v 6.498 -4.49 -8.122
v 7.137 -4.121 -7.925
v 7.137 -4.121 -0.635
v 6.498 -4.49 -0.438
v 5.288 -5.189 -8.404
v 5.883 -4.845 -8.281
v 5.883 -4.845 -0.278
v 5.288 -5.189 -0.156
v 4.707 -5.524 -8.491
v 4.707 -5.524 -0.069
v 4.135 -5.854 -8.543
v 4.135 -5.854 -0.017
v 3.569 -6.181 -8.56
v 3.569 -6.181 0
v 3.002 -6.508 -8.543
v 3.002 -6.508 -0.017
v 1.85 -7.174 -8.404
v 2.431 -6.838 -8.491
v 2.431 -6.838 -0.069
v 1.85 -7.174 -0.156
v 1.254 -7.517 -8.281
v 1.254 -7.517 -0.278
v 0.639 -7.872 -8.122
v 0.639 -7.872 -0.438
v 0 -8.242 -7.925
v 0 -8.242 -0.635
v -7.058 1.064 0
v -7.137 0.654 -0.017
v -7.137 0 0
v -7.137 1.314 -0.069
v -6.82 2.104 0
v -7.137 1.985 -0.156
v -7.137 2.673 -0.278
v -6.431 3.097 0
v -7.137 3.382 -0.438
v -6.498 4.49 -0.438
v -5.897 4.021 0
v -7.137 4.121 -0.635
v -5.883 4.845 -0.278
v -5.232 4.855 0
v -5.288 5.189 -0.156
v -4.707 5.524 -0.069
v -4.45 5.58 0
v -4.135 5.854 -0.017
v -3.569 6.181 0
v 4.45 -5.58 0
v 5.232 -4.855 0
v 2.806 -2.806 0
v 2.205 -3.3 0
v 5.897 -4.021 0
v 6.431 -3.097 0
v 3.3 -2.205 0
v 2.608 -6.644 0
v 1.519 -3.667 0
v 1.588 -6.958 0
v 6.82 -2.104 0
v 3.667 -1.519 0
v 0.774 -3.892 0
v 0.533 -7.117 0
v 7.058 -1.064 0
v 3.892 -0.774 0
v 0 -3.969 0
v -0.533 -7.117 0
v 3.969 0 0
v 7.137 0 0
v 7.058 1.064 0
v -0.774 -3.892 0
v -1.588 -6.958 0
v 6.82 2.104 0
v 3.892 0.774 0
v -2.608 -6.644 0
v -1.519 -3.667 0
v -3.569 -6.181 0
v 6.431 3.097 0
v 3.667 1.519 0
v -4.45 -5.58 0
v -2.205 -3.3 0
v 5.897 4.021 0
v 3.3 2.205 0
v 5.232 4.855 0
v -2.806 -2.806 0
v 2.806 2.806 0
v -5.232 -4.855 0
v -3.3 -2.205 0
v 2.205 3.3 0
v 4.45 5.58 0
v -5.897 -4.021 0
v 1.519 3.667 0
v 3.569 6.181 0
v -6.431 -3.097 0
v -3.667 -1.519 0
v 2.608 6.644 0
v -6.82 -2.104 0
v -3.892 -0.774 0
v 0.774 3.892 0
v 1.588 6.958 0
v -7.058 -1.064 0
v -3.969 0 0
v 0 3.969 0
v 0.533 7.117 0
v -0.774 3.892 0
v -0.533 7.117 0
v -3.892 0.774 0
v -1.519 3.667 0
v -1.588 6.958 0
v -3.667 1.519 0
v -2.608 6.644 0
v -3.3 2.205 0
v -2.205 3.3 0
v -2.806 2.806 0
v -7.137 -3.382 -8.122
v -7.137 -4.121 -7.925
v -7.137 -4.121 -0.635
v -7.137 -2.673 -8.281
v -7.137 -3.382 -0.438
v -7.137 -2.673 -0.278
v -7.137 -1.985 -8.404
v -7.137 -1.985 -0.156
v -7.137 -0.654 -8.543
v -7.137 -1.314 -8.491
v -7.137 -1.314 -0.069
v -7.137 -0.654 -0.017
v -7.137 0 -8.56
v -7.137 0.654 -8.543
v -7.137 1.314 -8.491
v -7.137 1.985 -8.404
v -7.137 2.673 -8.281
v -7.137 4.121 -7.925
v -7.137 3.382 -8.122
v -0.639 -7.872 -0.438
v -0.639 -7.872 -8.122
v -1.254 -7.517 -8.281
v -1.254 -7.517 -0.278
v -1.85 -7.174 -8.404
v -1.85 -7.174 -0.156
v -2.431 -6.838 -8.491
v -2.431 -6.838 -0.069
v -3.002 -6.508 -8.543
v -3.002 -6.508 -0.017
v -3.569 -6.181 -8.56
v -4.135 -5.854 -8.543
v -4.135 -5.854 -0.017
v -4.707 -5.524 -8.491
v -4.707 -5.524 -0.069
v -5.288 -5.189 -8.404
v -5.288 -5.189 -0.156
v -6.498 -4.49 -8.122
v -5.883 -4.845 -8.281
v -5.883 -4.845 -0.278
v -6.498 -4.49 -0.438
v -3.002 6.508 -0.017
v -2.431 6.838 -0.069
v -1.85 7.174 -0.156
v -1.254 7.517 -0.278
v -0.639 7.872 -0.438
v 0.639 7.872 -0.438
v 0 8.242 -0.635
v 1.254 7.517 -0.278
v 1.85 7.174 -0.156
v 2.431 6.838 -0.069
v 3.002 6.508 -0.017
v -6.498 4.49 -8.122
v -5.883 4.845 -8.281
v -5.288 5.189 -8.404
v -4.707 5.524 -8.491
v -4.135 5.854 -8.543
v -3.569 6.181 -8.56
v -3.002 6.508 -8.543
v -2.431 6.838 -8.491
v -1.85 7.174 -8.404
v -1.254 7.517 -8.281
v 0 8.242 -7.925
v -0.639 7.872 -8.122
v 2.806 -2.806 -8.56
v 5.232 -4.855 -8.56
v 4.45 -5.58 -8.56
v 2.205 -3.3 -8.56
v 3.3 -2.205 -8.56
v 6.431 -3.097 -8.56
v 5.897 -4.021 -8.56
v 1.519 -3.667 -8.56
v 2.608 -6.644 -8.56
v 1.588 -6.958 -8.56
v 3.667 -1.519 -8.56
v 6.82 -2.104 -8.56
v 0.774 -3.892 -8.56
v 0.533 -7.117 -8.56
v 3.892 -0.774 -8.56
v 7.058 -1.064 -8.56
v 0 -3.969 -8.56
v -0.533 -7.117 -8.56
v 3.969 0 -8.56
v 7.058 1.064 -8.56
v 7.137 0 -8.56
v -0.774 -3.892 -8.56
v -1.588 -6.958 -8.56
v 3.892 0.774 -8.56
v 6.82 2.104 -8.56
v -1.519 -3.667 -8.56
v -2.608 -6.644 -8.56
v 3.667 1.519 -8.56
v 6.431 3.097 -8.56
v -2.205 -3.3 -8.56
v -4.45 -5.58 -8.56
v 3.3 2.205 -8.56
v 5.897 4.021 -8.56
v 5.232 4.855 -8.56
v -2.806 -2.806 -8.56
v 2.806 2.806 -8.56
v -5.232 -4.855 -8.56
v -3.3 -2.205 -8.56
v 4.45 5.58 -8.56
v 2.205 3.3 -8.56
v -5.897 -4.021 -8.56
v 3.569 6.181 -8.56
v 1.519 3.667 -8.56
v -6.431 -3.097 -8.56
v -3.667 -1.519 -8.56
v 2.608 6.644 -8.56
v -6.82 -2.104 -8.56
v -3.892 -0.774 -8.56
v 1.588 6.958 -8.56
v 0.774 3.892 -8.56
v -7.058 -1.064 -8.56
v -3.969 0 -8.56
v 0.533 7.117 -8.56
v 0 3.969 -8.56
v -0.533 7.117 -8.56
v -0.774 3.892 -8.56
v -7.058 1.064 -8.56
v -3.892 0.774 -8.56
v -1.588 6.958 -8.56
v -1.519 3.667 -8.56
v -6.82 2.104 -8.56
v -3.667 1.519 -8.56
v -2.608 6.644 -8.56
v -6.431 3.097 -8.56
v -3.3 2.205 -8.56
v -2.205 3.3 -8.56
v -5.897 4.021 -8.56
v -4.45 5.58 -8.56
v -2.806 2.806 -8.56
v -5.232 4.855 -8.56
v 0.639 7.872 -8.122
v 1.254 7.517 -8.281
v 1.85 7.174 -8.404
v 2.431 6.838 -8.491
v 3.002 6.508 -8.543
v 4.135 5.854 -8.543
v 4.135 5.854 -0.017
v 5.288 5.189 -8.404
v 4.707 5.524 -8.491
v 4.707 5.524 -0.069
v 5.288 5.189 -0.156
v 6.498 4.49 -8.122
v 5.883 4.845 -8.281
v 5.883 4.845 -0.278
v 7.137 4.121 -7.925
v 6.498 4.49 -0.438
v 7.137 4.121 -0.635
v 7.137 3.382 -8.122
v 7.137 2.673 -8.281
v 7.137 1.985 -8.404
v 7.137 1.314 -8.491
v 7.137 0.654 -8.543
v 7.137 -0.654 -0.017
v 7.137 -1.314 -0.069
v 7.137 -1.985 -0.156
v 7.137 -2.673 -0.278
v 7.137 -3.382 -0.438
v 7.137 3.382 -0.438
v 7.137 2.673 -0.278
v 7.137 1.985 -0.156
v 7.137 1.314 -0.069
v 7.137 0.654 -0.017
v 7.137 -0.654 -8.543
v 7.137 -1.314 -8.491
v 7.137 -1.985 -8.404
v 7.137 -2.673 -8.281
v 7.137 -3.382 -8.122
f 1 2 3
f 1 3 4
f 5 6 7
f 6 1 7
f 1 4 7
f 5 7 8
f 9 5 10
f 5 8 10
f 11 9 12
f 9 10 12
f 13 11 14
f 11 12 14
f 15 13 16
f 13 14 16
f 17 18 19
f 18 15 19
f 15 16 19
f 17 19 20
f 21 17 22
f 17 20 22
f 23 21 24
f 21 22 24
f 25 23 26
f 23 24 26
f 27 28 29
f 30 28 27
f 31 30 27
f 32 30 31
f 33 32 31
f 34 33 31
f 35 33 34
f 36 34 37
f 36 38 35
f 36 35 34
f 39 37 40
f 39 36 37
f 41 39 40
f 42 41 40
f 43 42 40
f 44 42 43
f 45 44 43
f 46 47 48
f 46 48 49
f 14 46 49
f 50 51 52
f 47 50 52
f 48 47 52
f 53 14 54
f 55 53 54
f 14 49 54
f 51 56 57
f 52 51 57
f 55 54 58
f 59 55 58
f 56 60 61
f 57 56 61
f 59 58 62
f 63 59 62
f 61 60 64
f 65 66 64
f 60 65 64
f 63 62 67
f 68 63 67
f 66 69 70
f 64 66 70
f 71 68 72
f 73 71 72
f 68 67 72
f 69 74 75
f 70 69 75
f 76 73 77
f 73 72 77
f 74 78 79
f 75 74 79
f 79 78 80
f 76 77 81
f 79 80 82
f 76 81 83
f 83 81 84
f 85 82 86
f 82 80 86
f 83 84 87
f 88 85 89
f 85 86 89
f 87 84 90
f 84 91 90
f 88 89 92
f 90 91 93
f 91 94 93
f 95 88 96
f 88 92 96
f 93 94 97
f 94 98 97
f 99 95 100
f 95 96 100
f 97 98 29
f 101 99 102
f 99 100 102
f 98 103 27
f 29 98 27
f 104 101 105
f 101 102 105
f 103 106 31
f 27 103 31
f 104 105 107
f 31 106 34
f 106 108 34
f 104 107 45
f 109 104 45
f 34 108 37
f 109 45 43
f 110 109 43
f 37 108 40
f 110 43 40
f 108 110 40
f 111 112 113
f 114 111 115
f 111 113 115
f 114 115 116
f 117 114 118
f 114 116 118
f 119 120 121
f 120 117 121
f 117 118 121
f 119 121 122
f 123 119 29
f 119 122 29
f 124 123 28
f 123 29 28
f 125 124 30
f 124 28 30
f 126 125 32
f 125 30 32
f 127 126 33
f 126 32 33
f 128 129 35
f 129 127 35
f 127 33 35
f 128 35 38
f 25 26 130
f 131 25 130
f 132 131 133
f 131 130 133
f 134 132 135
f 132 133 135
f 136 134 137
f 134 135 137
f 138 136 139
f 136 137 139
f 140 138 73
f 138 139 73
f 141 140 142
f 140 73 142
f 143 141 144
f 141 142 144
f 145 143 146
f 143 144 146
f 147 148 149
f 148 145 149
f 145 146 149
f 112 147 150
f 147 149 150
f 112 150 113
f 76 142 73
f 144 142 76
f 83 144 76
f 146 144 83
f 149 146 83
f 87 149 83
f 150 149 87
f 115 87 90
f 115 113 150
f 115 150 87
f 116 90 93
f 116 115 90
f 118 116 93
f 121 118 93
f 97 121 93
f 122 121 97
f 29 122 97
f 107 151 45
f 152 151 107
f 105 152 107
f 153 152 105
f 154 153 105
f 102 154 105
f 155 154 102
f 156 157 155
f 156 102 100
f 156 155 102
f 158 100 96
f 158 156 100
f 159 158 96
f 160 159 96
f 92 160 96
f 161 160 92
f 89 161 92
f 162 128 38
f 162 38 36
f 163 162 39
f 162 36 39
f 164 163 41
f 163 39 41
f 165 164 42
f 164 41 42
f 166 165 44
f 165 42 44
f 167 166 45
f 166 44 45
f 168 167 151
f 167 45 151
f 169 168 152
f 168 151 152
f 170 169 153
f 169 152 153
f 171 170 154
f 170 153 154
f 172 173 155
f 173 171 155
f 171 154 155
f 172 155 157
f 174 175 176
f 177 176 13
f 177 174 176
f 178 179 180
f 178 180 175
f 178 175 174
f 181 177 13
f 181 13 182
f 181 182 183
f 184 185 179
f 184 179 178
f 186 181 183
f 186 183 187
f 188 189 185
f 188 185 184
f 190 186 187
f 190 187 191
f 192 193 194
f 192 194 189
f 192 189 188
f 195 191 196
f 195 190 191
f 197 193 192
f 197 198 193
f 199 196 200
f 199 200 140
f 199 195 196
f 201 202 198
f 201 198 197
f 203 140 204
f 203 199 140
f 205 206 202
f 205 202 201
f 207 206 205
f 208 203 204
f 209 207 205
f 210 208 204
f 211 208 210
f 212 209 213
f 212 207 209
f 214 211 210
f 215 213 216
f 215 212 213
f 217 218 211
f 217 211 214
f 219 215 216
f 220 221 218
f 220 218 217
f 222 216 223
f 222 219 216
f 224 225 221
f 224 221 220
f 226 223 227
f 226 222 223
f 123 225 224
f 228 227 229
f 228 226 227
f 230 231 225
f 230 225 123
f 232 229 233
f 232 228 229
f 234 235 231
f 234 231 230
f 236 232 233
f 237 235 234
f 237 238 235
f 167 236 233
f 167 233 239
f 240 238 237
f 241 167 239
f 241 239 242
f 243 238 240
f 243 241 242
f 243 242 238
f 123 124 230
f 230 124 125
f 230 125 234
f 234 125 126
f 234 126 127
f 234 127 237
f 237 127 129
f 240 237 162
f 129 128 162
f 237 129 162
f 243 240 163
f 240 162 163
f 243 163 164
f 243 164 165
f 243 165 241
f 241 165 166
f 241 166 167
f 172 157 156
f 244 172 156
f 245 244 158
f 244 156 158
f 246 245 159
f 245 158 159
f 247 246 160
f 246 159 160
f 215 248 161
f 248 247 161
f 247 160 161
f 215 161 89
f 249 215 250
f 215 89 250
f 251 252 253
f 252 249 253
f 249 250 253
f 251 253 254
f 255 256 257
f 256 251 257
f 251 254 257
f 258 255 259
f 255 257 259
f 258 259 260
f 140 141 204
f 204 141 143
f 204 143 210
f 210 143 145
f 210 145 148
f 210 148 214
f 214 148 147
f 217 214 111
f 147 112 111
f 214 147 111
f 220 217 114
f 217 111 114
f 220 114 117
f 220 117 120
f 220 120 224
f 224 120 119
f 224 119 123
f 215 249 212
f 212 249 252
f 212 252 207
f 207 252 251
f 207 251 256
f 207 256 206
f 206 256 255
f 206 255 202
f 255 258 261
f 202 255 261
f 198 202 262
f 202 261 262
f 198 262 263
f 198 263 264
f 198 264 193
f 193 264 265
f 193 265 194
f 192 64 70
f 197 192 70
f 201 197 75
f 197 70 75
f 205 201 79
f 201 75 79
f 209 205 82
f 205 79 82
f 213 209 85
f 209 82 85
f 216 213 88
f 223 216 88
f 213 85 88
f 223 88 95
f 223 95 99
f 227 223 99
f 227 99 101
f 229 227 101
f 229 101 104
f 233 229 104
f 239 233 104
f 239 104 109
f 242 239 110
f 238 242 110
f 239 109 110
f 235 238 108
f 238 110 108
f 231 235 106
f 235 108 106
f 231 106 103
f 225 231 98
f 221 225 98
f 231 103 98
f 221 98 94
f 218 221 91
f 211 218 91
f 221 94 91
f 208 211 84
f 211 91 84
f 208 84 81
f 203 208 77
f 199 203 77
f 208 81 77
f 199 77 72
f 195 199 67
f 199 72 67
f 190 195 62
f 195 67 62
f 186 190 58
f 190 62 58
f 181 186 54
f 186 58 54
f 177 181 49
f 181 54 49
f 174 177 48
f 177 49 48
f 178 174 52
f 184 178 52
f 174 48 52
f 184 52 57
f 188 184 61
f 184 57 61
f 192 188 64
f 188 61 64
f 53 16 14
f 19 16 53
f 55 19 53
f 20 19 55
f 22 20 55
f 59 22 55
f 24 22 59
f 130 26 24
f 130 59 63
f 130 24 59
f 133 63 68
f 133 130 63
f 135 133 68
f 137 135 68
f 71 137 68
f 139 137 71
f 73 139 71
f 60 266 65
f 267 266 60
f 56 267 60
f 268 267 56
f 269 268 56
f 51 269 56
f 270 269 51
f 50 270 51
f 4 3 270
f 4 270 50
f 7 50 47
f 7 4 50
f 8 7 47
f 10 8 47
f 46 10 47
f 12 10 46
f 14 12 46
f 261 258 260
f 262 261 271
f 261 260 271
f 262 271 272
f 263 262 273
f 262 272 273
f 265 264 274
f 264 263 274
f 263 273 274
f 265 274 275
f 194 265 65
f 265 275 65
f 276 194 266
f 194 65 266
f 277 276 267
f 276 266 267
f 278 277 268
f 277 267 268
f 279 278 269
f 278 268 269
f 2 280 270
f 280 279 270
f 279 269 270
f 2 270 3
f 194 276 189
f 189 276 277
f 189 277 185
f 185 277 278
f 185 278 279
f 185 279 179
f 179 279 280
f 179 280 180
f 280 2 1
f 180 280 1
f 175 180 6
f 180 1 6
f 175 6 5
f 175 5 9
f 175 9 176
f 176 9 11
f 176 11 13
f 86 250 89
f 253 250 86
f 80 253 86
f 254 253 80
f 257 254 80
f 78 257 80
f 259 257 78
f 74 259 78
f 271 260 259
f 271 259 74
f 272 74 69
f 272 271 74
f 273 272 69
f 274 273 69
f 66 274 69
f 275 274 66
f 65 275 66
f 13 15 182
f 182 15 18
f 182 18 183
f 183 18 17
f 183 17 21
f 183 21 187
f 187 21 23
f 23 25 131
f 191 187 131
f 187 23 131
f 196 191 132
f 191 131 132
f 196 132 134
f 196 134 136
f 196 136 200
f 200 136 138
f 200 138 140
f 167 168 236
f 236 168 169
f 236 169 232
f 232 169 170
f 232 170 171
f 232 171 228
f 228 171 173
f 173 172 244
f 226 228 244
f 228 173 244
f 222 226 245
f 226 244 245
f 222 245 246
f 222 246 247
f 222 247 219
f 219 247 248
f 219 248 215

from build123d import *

# Parameters (mm, degrees)
BASENUTSKE_R  = 3.96875
BASENUT_DEPTH = 8.5598


with BuildPart() as part:
    # BaseNutSke → BaseNut (new body)
    with BuildSketch(Plane.XY):
        Polygon((7.1374, 4.120779811), (7.1374, -4.120779811), (0, -8.241559623), (-7.1374, -4.120779811), (-7.1374, 4.120779811), (0, 8.241559623), align=None)
        Circle(BASENUTSKE_R, mode=Mode.SUBTRACT)
    extrude(amount=-BASENUT_DEPTH)

    # Sketch3 → Double-Chamfer (revolve, cut)
    with BuildSketch(Plane(origin=(0, 0, 0), x_dir=(0, 0, -1), z_dir=(1, 0, 0))):
        Polygon((8.5598, 7.1374), (7.9248, 8.241559623), (7.9248, 20.941559623), (21.2598, 20.941559623), (21.2598, 7.1374), align=None)
        Polygon((0.635, 20.941559623), (-12.7, 20.941559623), (-12.7, 7.1374), (0, 7.1374), (0.635, 8.241559623), align=None)
    revolve(axis=Axis((0, 0, 0), (0, 0, -1)), mode=Mode.SUBTRACT)

    # Sketch5 → EndChamfer (revolve, cut)
    with BuildSketch(Plane(origin=(0, 0, 0), x_dir=(0, 0, -1), z_dir=(1, 0, 0))):
        Polygon((8.5344, 3.175), (8.055086934, 2.49047), (8.5852, 2.49047), (8.5852, 3.175), align=None)
        Polygon((-0.0508, 3.175), (0, 3.175), (0.479313066, 2.49047), (-0.0508, 2.49047), align=None)
    revolve(axis=Axis((0, 0, -25.037505729), (0, 0, -1)), mode=Mode.SUBTRACT)


solid = part.part
